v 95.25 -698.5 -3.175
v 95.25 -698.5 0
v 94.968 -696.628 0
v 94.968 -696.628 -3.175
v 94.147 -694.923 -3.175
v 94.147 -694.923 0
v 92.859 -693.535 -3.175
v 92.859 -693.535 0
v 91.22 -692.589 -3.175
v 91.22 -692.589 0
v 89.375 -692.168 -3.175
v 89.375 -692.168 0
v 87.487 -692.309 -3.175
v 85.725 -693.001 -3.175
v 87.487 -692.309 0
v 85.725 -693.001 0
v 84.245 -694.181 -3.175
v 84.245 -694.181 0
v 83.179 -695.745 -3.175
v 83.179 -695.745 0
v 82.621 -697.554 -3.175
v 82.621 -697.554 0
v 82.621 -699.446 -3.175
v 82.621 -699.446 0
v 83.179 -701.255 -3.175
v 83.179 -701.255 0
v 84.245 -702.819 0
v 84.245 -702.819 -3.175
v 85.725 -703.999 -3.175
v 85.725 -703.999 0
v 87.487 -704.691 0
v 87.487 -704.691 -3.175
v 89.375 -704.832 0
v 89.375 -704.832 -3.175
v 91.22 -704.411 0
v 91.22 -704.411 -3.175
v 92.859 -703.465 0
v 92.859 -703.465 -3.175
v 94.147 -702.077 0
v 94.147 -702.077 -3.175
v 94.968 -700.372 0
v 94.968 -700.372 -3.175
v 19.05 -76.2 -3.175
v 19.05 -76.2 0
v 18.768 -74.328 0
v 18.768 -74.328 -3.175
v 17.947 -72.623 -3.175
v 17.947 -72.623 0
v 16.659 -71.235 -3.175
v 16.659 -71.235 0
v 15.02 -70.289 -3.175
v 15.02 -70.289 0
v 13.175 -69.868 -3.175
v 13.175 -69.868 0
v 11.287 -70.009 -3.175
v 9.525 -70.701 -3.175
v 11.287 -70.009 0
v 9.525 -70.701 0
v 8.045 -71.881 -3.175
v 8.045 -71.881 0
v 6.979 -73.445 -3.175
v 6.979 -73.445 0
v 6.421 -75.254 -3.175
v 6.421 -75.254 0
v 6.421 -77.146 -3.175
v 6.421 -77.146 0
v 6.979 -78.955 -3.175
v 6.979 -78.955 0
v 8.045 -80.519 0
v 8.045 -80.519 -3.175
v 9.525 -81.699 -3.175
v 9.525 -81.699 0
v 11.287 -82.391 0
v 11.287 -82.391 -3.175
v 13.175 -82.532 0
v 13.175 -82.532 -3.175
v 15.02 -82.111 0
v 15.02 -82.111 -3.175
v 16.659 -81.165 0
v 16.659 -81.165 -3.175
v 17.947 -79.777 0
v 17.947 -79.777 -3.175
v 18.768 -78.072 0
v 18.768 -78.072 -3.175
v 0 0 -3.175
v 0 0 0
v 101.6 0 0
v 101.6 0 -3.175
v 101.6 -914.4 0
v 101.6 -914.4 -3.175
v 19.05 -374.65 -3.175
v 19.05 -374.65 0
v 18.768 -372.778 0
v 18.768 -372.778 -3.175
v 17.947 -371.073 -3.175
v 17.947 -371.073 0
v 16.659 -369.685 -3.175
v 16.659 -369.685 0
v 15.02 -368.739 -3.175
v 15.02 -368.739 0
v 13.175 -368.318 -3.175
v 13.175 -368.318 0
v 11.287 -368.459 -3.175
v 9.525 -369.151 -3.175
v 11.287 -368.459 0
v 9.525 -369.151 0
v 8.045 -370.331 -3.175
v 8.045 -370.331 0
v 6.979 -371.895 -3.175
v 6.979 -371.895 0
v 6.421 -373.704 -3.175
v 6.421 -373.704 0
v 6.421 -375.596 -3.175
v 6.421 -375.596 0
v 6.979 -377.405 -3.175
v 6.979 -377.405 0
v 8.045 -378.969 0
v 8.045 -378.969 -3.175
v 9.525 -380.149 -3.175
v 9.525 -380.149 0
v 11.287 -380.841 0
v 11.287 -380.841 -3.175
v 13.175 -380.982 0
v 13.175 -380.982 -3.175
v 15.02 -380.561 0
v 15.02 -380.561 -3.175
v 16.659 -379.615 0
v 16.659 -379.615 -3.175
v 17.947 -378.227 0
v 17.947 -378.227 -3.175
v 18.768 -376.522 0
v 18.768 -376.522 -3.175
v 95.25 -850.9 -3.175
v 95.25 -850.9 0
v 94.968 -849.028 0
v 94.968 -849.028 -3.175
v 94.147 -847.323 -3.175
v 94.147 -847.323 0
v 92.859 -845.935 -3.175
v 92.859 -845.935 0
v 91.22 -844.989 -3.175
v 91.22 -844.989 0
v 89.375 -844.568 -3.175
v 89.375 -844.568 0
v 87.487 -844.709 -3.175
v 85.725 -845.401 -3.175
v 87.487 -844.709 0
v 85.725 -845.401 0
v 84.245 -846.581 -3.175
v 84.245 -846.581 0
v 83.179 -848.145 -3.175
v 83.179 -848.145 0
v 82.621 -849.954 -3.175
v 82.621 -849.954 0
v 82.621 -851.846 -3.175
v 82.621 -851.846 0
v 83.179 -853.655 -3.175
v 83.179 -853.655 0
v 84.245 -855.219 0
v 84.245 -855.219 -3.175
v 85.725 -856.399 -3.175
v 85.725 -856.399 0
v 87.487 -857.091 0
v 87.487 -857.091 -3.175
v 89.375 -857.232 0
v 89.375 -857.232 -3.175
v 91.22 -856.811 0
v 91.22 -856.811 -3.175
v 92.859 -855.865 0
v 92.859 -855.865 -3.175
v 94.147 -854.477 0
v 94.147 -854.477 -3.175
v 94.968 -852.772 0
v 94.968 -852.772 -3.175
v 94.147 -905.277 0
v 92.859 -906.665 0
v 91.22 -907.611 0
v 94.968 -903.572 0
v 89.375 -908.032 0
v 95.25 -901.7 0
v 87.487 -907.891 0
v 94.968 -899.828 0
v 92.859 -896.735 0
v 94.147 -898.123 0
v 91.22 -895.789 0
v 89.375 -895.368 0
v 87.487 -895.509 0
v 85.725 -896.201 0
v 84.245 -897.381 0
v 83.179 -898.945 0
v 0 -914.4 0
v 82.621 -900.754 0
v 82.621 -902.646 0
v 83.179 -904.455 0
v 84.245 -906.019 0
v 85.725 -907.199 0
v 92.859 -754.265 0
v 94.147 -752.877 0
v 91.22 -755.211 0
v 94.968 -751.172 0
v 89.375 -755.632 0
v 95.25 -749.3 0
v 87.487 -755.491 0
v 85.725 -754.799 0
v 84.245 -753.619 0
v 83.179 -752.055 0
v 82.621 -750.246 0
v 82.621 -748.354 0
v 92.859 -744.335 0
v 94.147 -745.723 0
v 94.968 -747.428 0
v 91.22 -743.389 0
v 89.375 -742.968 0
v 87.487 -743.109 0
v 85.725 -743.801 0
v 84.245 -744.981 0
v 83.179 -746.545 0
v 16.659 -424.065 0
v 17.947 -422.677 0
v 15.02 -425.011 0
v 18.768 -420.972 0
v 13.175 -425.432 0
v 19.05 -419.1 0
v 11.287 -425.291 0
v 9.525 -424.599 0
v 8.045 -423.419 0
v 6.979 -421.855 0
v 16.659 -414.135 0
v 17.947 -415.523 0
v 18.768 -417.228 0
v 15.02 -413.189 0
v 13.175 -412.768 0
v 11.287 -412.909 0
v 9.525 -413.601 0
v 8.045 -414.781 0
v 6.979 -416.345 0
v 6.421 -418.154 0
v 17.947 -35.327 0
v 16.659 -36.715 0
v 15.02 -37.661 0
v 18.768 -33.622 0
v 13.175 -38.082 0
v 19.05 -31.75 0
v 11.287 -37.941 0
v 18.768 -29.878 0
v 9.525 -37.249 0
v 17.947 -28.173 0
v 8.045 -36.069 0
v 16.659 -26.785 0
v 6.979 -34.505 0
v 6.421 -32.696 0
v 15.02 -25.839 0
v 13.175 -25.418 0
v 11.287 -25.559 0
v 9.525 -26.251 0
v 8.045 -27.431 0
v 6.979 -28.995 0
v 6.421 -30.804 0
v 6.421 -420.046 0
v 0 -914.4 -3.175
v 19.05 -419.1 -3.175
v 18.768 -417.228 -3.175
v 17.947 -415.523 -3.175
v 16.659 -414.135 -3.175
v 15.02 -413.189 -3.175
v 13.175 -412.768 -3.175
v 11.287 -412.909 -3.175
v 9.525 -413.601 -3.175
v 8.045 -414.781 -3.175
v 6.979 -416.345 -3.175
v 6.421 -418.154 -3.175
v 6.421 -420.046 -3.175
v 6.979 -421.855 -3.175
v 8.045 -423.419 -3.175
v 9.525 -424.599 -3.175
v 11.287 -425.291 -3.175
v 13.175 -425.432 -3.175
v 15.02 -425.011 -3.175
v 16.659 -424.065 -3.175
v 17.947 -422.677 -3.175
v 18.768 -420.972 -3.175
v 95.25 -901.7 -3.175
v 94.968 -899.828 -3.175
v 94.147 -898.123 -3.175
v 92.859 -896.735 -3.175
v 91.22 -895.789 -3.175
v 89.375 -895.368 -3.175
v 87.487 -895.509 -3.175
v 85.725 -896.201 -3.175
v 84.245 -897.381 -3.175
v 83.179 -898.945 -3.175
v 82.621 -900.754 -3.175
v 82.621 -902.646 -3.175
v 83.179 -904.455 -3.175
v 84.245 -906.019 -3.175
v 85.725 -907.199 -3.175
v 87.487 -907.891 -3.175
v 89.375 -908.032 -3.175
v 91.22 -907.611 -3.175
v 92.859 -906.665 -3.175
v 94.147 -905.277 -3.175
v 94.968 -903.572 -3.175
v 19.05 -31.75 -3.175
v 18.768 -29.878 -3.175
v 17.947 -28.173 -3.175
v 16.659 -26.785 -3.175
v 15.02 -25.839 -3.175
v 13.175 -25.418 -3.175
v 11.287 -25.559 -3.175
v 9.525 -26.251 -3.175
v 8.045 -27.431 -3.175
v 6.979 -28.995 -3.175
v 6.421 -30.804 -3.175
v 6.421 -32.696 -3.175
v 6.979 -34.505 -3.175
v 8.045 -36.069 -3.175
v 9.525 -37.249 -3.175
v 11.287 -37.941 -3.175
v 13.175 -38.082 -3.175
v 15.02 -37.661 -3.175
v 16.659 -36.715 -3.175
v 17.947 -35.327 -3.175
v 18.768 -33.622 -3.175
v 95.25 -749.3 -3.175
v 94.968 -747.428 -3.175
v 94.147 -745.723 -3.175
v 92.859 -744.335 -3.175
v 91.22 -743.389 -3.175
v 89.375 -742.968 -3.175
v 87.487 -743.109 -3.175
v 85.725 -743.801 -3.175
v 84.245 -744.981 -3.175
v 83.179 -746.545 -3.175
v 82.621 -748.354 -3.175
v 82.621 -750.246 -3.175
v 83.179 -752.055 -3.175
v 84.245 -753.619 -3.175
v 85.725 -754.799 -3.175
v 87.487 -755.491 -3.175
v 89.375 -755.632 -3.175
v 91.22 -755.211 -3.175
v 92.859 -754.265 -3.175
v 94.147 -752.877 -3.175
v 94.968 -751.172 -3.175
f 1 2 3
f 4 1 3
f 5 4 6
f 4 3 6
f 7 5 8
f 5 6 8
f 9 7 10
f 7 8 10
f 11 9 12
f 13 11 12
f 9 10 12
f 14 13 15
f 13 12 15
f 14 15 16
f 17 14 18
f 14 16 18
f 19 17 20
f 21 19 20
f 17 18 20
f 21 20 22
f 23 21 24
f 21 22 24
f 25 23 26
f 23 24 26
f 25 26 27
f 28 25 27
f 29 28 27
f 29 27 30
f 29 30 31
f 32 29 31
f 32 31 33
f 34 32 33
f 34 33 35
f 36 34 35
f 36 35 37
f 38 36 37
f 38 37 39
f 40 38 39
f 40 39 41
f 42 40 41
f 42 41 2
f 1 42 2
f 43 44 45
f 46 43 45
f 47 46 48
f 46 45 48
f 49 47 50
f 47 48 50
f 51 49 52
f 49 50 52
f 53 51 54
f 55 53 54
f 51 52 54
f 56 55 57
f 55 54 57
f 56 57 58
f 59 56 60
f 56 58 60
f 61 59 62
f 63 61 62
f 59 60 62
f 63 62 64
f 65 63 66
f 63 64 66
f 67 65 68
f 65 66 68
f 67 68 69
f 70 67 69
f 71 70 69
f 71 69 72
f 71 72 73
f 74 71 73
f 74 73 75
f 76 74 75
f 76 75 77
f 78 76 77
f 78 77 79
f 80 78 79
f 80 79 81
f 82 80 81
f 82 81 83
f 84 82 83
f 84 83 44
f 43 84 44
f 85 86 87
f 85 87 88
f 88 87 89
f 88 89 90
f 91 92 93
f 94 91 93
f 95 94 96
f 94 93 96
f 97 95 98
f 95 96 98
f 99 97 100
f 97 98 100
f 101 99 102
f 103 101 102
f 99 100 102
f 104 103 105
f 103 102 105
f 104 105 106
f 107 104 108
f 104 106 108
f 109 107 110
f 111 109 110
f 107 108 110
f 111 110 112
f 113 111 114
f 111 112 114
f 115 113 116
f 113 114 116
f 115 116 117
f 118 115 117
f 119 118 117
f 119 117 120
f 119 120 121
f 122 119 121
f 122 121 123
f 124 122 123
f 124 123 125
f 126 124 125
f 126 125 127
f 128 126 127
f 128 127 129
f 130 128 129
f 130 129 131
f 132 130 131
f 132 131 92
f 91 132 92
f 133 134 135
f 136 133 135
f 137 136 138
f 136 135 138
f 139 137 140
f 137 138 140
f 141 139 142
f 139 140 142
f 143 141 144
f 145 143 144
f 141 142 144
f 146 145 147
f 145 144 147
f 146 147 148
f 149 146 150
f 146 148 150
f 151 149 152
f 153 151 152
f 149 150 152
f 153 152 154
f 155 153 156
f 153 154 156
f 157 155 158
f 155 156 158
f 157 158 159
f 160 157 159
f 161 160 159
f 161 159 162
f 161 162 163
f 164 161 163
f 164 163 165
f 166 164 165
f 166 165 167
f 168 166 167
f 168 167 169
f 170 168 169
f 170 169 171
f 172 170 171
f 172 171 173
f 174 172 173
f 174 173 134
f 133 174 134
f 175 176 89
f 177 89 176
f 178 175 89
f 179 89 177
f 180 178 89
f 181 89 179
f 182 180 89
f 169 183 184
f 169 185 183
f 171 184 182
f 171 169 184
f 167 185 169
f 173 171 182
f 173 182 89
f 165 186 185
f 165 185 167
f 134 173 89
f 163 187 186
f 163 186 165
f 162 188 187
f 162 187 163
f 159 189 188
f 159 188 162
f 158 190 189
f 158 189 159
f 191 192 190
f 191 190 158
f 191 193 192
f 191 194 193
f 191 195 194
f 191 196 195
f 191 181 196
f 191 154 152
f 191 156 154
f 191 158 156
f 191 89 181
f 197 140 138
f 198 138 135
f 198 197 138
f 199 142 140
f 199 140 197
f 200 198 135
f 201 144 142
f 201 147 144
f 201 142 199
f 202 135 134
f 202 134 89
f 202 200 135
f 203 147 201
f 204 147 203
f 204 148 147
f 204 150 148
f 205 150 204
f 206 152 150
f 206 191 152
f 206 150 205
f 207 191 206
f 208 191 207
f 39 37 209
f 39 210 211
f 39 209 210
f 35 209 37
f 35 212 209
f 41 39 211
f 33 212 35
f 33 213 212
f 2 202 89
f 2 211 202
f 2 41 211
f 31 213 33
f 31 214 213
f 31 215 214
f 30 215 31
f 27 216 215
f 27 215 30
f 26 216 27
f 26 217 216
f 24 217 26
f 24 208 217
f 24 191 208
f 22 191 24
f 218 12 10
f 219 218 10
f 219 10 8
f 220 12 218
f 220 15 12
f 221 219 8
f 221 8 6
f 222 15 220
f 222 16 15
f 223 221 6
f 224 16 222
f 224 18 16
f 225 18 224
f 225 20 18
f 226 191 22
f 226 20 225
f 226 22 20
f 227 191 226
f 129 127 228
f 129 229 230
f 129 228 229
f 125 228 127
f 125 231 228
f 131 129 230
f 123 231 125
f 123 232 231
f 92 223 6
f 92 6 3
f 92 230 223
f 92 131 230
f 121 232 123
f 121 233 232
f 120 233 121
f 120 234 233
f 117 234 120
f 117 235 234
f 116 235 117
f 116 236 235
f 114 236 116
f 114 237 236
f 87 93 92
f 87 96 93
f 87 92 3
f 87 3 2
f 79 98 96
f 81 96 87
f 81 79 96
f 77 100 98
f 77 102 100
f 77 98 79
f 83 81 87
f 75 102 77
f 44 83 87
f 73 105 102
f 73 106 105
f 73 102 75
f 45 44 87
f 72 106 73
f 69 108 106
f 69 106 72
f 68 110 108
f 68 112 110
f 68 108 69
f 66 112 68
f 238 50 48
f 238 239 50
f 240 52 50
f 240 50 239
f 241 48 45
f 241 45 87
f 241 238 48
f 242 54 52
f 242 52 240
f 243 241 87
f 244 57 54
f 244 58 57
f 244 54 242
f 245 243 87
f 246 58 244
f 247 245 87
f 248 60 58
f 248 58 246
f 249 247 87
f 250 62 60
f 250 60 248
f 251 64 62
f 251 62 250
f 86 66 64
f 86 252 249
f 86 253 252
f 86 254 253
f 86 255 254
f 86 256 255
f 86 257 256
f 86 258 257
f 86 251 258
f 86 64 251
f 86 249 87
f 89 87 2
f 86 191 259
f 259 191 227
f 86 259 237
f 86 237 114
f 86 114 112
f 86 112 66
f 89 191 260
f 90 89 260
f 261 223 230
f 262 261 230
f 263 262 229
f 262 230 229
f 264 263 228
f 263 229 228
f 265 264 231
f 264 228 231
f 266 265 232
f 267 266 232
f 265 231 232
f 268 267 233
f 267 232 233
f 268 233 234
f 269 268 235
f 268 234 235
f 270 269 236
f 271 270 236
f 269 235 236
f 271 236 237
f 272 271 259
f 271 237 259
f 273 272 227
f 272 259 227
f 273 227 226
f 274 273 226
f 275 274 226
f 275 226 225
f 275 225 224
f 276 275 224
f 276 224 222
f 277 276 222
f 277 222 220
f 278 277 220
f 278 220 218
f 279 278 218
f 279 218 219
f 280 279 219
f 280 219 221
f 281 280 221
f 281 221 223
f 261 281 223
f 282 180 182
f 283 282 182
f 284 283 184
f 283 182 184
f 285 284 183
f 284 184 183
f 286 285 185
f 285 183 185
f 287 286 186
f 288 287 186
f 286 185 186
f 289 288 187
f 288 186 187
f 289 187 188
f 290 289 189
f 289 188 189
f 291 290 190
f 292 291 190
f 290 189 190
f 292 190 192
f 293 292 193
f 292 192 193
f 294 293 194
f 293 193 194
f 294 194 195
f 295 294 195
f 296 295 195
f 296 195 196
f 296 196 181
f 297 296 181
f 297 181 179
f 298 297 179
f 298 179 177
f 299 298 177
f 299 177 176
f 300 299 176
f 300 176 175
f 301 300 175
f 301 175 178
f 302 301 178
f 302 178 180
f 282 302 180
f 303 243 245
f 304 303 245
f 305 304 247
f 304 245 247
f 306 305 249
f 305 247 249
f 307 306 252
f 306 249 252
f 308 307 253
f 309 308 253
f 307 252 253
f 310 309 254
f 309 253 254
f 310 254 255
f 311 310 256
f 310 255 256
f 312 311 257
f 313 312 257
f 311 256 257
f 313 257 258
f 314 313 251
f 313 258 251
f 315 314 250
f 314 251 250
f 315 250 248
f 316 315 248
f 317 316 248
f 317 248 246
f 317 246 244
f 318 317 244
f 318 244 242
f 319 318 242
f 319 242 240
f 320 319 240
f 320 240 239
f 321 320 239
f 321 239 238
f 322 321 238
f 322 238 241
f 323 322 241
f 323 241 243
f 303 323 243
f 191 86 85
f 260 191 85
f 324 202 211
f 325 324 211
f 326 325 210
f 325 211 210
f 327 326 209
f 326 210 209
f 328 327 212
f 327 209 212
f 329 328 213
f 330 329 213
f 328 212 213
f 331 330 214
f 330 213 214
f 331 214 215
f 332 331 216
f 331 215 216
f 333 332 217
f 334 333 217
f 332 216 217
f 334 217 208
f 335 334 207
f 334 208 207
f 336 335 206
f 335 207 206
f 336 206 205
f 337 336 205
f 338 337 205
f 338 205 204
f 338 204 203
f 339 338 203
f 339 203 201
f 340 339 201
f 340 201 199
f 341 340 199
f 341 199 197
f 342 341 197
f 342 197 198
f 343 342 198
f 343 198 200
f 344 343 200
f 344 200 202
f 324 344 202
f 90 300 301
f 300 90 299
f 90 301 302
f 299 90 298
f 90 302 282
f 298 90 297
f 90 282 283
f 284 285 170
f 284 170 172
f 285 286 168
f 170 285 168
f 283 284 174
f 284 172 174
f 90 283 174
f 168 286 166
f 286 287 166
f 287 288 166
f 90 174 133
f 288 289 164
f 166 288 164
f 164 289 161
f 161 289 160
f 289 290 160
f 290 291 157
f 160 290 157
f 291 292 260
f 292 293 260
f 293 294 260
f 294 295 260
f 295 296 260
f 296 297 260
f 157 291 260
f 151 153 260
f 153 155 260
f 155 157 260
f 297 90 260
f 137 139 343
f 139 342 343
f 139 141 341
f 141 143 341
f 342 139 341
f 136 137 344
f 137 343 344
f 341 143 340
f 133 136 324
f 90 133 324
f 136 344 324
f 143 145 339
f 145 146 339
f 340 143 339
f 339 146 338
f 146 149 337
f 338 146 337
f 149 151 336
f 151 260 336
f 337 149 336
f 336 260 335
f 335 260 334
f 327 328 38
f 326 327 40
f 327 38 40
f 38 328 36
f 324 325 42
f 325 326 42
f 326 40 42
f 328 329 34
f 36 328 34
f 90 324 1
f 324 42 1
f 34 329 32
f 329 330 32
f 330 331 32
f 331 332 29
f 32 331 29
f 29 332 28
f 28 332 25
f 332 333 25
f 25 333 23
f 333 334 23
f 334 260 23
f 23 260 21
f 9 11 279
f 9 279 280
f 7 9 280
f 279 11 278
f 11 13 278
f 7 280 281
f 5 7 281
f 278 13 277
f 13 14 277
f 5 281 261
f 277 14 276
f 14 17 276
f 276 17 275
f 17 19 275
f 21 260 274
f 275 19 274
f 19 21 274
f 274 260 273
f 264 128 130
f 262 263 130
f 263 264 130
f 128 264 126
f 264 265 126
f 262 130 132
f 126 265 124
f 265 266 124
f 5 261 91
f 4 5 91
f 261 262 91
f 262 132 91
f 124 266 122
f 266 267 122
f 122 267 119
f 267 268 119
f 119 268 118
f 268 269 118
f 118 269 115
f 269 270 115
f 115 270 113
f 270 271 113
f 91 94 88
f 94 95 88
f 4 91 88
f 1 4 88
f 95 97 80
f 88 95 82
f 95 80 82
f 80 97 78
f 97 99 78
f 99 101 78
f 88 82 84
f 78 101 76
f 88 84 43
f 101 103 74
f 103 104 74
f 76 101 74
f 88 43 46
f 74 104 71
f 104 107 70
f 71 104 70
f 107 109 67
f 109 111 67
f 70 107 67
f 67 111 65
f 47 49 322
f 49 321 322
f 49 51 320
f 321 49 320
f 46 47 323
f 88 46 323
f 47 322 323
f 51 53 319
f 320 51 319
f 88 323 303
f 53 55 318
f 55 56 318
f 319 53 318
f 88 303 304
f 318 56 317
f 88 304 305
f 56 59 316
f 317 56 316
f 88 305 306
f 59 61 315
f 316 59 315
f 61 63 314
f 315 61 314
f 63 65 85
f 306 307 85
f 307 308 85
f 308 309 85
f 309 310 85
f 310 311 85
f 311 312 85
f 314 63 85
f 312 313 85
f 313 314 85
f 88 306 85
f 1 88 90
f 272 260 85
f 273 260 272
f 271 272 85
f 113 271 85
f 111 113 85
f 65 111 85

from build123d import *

# Parameters (mm, degrees)
SKETCH1_W          = 3.175
SKETCH1_H          = 914.4
EXTRUDE1_DEPTH     = 101.6
SKETCH3_R          = 6.35
CUT_EXTRUDE2_DEPTH = 50.8
SKETCH4_R          = 6.35
CUT_EXTRUDE3_DEPTH = 50.8


with BuildPart() as part:
    # Sketch1 → Extrude1 (new body)
    with BuildSketch(Plane(origin=(0, 0, 0), x_dir=(0, 0, -1), z_dir=(1, 0, 0))):
        with Locations((1.5875, -457.2)):
            Rectangle(SKETCH1_W, SKETCH1_H)
    extrude(amount=EXTRUDE1_DEPTH)

    # Sketch3 → Cut-Extrude2 (cut)
    with BuildSketch(Plane.XY):
        with Locations((88.9, -901.7)):
            Circle(SKETCH3_R)
        with Locations((88.9, -850.9)):
            Circle(SKETCH3_R)
        with Locations((88.9, -749.3)):
            Circle(SKETCH3_R)
        with Locations((88.9, -698.5)):
            Circle(SKETCH3_R)
    extrude(amount=-CUT_EXTRUDE2_DEPTH, mode=Mode.SUBTRACT)

    # Sketch4 → Cut-Extrude3 (cut)
    with BuildSketch(Plane.XY):
        with Locations((12.7, -419.1)):
            Circle(SKETCH4_R)
        with Locations((12.7, -374.65)):
            Circle(SKETCH4_R)
        with Locations((12.7, -76.2)):
            Circle(SKETCH4_R)
        with Locations((12.7, -31.75)):
            Circle(SKETCH4_R)
    extrude(amount=-CUT_EXTRUDE3_DEPTH, mode=Mode.SUBTRACT)


solid = part.part
